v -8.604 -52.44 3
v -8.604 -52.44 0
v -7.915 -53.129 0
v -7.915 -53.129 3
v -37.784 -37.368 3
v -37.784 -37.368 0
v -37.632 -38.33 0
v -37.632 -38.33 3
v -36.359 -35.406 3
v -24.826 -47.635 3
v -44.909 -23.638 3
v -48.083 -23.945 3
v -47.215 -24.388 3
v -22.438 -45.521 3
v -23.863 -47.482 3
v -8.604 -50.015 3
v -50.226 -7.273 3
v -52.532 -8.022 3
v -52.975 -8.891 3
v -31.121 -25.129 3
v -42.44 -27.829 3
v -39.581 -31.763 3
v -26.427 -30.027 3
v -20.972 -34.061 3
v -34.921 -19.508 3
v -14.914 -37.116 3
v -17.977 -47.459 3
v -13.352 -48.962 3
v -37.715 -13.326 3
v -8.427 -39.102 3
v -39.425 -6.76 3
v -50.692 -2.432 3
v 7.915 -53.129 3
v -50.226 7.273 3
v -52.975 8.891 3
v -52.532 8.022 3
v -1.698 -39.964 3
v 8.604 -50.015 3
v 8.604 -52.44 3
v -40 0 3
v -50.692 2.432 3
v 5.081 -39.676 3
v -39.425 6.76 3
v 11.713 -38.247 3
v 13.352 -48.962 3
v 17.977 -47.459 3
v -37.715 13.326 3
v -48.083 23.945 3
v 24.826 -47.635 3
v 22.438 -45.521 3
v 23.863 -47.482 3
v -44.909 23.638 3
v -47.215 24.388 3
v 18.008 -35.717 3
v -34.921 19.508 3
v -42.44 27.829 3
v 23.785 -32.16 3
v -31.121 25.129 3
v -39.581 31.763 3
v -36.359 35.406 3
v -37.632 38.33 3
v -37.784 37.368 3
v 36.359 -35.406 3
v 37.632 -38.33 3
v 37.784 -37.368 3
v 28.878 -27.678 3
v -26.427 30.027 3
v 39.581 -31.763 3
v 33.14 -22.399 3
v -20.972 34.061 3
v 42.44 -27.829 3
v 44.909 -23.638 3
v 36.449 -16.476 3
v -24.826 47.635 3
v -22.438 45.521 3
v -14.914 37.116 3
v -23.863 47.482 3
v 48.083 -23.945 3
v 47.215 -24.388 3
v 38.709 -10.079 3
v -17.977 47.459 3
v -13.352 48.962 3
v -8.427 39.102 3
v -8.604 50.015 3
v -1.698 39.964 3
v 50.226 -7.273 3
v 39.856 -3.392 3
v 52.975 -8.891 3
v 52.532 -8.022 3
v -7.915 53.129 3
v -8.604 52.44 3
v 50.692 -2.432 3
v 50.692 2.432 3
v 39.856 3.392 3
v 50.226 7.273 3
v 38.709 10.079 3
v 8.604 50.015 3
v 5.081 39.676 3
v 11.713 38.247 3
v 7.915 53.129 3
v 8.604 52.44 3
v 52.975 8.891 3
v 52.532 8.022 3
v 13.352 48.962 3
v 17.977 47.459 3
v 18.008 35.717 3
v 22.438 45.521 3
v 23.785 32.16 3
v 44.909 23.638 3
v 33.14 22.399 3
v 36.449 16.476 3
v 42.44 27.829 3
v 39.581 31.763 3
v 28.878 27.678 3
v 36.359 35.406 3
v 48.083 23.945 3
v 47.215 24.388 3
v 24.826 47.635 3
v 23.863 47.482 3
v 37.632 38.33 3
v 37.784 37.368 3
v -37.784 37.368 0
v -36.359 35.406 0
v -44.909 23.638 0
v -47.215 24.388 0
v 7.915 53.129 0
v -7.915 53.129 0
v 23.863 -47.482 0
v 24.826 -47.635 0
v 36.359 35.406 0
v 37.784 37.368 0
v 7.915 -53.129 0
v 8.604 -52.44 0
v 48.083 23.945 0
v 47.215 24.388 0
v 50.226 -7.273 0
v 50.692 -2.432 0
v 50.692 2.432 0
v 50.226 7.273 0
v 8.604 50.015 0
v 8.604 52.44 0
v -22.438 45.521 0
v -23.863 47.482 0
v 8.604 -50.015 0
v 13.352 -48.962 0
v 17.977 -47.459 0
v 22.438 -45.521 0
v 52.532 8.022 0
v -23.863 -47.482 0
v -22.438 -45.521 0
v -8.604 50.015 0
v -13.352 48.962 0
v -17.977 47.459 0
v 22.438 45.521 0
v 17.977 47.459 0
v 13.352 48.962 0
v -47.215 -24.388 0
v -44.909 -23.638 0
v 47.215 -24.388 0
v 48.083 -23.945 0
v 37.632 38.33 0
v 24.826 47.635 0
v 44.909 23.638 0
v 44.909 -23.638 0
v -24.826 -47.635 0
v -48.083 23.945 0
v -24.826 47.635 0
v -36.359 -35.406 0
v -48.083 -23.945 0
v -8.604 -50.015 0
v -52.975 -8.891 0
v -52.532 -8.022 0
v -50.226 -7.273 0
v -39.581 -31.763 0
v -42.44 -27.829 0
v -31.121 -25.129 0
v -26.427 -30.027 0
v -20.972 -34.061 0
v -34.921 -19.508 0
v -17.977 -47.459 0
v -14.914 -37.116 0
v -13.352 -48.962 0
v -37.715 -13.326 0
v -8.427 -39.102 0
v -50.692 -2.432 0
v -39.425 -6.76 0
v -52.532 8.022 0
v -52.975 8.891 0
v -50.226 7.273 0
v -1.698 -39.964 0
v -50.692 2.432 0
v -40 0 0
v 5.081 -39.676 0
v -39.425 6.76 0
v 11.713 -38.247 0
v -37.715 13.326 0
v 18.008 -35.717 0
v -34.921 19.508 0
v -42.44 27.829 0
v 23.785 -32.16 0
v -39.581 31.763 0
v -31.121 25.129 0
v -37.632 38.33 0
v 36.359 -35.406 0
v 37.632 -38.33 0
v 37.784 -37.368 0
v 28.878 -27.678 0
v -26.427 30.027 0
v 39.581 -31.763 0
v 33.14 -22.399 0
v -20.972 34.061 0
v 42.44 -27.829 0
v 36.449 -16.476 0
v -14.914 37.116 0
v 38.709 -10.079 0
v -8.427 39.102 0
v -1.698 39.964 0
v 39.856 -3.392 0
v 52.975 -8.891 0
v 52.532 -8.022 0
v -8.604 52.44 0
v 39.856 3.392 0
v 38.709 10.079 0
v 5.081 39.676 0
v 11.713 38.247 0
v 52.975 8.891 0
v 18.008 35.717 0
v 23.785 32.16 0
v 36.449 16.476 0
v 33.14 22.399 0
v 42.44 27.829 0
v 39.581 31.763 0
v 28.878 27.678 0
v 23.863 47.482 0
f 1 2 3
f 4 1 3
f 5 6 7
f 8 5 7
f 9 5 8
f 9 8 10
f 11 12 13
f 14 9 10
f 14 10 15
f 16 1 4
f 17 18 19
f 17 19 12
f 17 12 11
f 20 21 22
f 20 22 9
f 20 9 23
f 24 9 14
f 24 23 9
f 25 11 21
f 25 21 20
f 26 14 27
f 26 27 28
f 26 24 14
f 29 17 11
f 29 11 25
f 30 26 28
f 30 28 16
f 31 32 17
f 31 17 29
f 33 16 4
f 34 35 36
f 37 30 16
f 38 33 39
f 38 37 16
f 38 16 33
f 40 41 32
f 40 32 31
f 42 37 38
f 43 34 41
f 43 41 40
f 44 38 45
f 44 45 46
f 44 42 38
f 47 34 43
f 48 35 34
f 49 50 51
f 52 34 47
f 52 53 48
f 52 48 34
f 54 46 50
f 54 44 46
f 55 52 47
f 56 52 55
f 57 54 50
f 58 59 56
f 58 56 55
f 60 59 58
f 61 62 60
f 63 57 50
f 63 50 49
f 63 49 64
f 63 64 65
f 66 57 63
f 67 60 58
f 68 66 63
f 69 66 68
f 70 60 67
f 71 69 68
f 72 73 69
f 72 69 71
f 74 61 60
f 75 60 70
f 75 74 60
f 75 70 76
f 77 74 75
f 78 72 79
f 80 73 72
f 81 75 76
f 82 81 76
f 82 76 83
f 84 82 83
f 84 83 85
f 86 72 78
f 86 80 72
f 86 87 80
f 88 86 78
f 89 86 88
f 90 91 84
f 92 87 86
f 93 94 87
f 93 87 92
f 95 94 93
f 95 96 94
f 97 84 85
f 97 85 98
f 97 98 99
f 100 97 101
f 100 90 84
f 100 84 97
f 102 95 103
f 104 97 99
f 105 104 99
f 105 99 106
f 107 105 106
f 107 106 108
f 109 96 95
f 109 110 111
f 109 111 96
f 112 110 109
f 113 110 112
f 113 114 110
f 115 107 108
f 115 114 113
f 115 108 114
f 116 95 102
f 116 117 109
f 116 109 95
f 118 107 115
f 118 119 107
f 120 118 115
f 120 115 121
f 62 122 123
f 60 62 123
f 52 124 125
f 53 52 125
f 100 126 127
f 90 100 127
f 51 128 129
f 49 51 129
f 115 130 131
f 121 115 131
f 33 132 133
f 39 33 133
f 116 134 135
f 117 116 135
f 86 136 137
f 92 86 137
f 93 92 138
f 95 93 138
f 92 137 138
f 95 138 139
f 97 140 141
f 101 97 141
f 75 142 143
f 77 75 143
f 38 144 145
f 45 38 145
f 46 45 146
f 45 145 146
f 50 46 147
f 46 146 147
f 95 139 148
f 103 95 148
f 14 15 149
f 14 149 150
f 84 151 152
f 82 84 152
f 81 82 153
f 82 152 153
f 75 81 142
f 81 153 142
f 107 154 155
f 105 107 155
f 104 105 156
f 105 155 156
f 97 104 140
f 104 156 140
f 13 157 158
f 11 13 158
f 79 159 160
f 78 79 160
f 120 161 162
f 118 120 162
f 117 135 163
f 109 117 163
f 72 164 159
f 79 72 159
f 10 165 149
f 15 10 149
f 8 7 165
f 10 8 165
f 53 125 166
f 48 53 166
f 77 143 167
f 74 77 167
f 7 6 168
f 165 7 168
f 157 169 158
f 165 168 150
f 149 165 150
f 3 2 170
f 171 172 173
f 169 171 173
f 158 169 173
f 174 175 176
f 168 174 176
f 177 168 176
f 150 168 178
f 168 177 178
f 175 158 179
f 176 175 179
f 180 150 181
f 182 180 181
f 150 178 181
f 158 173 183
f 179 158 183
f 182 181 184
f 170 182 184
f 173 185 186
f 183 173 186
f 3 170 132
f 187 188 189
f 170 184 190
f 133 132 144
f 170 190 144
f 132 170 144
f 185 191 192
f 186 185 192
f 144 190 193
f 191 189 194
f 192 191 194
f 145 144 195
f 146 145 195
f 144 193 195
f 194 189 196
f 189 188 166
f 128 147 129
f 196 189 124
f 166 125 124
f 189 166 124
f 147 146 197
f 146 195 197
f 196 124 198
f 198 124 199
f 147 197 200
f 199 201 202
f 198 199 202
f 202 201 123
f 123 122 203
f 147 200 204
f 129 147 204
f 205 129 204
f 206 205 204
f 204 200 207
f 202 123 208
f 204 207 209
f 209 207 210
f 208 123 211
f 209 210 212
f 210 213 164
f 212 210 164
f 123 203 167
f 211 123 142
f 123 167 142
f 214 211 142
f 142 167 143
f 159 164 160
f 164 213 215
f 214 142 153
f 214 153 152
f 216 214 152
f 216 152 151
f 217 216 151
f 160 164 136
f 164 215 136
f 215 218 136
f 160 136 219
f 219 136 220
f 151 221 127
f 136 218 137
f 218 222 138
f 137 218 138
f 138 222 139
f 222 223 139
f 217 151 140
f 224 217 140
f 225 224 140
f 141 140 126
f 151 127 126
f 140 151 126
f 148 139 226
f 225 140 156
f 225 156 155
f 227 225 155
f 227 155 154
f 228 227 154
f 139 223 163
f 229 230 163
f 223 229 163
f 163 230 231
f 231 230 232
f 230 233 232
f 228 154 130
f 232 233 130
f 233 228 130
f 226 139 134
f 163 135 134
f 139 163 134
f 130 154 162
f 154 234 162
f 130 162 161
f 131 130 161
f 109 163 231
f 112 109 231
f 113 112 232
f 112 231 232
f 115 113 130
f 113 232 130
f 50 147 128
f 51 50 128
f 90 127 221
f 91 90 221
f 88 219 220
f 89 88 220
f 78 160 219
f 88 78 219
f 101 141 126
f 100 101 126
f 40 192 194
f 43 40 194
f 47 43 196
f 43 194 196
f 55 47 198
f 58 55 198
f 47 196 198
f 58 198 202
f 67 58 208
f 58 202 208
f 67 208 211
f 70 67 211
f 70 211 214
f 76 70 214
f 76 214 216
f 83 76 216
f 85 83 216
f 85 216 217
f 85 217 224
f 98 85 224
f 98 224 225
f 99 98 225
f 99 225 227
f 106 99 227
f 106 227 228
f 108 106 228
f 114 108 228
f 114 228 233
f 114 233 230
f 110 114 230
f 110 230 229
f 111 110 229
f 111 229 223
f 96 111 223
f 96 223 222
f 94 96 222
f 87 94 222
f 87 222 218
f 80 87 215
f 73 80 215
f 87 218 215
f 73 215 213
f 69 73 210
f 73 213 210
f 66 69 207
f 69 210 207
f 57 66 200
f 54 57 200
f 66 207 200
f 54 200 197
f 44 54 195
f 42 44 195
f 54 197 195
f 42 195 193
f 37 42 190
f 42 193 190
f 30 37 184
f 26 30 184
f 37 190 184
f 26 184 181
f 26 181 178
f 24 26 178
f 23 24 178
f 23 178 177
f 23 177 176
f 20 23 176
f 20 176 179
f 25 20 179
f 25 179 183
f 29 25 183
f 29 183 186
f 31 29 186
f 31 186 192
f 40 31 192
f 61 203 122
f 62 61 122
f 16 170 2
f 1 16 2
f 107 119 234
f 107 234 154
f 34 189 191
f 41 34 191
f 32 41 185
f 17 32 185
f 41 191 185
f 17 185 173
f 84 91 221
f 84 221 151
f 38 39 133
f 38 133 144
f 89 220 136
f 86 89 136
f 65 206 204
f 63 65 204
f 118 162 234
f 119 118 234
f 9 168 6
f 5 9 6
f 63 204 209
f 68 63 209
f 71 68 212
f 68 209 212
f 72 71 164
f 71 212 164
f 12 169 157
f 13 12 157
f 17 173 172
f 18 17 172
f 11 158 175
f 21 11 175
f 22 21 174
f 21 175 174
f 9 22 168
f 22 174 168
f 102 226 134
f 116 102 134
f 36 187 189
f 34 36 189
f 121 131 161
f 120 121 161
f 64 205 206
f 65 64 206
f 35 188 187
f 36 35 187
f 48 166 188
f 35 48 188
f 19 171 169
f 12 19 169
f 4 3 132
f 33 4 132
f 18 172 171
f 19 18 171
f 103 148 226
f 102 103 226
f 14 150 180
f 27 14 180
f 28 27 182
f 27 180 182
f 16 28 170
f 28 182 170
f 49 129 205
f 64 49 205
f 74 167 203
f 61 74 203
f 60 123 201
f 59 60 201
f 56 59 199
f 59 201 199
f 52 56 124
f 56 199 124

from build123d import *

# Parameters (mm, degrees)
BOSS_EXTRUDE1_DEPTH = 3
SKETCH1_R           = 40
CUT_EXTRUDE1_DEPTH  = 76.086906122


with BuildPart() as part:
    # Base_Sketch → Boss-Extrude1 (new body)
    with BuildSketch(Plane.XY):
        with BuildLine():
            Line((-8.603981625, 52.439957176), (-8.603981625, 50.01533765))
            ThreePointArc((-8.603981625, 50.01533765), (-15.682612465, 48.266118202), (-22.437510505, 45.520551648))
            Line((-22.437510505, 45.520551648), (-23.862666105, 47.48211005))
            Line((-23.862666105, 47.48211005), (-24.825537526, 47.634613901))
            Line((-24.825537526, 47.634613901), (-37.631696962, 38.33039445))
            Line((-37.631696962, 38.33039445), (-37.784200813, 37.36752303))
            Line((-37.784200813, 37.36752303), (-36.359045213, 35.405964628))
            ThreePointArc((-36.359045213, 35.405964628), (-41.057612465, 29.830101554), (-44.908636245, 23.638462104))
            Line((-44.908636245, 23.638462104), (-47.214586445, 24.387710742))
            Line((-47.214586445, 24.387710742), (-48.083205302, 23.945127328))
            Line((-48.083205302, 23.945127328), (-52.974722942, 8.890584019))
            Line((-52.974722942, 8.890584019), (-52.532139528, 8.021965161))
            Line((-52.532139528, 8.021965161), (-50.226189328, 7.272716523))
            ThreePointArc((-50.226189328, 7.272716523), (-50.75, 0), (-50.226189328, -7.272716523))
            Line((-50.226189328, -7.272716523), (-52.532139528, -8.021965161))
            Line((-52.532139528, -8.021965161), (-52.974722942, -8.890584019))
            Line((-52.974722942, -8.890584019), (-48.083205302, -23.945127328))
            Line((-48.083205302, -23.945127328), (-47.214586445, -24.387710742))
            Line((-47.214586445, -24.387710742), (-44.908636245, -23.638462104))
            ThreePointArc((-44.908636245, -23.638462104), (-41.057612465, -29.830101554), (-36.359045213, -35.405964628))
            Line((-36.359045213, -35.405964628), (-37.784200813, -37.36752303))
            Line((-37.784200813, -37.36752303), (-37.631696962, -38.33039445))
            Line((-37.631696962, -38.33039445), (-24.825537526, -47.634613901))
            Line((-24.825537526, -47.634613901), (-23.862666105, -47.48211005))
            Line((-23.862666105, -47.48211005), (-22.437510505, -45.520551648))
            ThreePointArc((-22.437510505, -45.520551648), (-15.682612465, -48.266118202), (-8.603981625, -50.01533765))
            Line((-8.603981625, -50.01533765), (-8.603981625, -52.439957176))
            Line((-8.603981625, -52.439957176), (-7.914641797, -53.129297004))
            Line((-7.914641797, -53.129297004), (7.914641797, -53.129297004))
            Line((7.914641797, -53.129297004), (8.603981625, -52.439957176))
            Line((8.603981625, -52.439957176), (8.603981625, -50.01533765))
            ThreePointArc((8.603981625, -50.01533765), (15.682612465, -48.266118202), (22.437510505, -45.520551648))
            Line((22.437510505, -45.520551648), (23.862666105, -47.48211005))
            Line((23.862666105, -47.48211005), (24.825537526, -47.634613901))
            Line((24.825537526, -47.634613901), (37.631696962, -38.33039445))
            Line((37.631696962, -38.33039445), (37.784200813, -37.36752303))
            Line((37.784200813, -37.36752303), (36.359045213, -35.405964628))
            ThreePointArc((36.359045213, -35.405964628), (41.057612465, -29.830101554), (44.908636245, -23.638462104))
            Line((44.908636245, -23.638462104), (47.214586445, -24.387710742))
            Line((47.214586445, -24.387710742), (48.083205302, -23.945127328))
            Line((48.083205302, -23.945127328), (52.974722942, -8.890584019))
            Line((52.974722942, -8.890584019), (52.532139528, -8.021965161))
            Line((52.532139528, -8.021965161), (50.226189328, -7.272716523))
            ThreePointArc((50.226189328, -7.272716523), (50.75, 0), (50.226189328, 7.272716523))
            Line((50.226189328, 7.272716523), (52.532139528, 8.021965161))
            Line((52.532139528, 8.021965161), (52.974722942, 8.890584019))
            Line((52.974722942, 8.890584019), (48.083205302, 23.945127328))
            Line((48.083205302, 23.945127328), (47.214586445, 24.387710742))
            Line((47.214586445, 24.387710742), (44.908636245, 23.638462104))
            ThreePointArc((44.908636245, 23.638462104), (41.057612465, 29.830101554), (36.359045213, 35.405964628))
            Line((36.359045213, 35.405964628), (37.784200813, 37.36752303))
            Line((37.784200813, 37.36752303), (37.631696962, 38.33039445))
            Line((37.631696962, 38.33039445), (24.825537526, 47.634613901))
            Line((24.825537526, 47.634613901), (23.862666105, 47.48211005))
            Line((23.862666105, 47.48211005), (22.437510505, 45.520551648))
            ThreePointArc((22.437510505, 45.520551648), (15.682612465, 48.266118202), (8.603981625, 50.01533765))
            Line((8.603981625, 50.01533765), (8.603981625, 52.439957176))
            Line((8.603981625, 52.439957176), (7.914641797, 53.129297004))
            Line((7.914641797, 53.129297004), (-7.914641797, 53.129297004))
            Line((-7.914641797, 53.129297004), (-8.603981625, 52.439957176))
        make_face()
    extrude(amount=BOSS_EXTRUDE1_DEPTH)

    # Sketch1 → Cut-Extrude1 (cut, through all)
    with BuildSketch(Plane(origin=(0, 0, 0), x_dir=(-1, 0, 0), z_dir=(0, 0, -1))):
        Circle(SKETCH1_R)
    extrude(amount=-CUT_EXTRUDE1_DEPTH, mode=Mode.SUBTRACT)


solid = part.part
